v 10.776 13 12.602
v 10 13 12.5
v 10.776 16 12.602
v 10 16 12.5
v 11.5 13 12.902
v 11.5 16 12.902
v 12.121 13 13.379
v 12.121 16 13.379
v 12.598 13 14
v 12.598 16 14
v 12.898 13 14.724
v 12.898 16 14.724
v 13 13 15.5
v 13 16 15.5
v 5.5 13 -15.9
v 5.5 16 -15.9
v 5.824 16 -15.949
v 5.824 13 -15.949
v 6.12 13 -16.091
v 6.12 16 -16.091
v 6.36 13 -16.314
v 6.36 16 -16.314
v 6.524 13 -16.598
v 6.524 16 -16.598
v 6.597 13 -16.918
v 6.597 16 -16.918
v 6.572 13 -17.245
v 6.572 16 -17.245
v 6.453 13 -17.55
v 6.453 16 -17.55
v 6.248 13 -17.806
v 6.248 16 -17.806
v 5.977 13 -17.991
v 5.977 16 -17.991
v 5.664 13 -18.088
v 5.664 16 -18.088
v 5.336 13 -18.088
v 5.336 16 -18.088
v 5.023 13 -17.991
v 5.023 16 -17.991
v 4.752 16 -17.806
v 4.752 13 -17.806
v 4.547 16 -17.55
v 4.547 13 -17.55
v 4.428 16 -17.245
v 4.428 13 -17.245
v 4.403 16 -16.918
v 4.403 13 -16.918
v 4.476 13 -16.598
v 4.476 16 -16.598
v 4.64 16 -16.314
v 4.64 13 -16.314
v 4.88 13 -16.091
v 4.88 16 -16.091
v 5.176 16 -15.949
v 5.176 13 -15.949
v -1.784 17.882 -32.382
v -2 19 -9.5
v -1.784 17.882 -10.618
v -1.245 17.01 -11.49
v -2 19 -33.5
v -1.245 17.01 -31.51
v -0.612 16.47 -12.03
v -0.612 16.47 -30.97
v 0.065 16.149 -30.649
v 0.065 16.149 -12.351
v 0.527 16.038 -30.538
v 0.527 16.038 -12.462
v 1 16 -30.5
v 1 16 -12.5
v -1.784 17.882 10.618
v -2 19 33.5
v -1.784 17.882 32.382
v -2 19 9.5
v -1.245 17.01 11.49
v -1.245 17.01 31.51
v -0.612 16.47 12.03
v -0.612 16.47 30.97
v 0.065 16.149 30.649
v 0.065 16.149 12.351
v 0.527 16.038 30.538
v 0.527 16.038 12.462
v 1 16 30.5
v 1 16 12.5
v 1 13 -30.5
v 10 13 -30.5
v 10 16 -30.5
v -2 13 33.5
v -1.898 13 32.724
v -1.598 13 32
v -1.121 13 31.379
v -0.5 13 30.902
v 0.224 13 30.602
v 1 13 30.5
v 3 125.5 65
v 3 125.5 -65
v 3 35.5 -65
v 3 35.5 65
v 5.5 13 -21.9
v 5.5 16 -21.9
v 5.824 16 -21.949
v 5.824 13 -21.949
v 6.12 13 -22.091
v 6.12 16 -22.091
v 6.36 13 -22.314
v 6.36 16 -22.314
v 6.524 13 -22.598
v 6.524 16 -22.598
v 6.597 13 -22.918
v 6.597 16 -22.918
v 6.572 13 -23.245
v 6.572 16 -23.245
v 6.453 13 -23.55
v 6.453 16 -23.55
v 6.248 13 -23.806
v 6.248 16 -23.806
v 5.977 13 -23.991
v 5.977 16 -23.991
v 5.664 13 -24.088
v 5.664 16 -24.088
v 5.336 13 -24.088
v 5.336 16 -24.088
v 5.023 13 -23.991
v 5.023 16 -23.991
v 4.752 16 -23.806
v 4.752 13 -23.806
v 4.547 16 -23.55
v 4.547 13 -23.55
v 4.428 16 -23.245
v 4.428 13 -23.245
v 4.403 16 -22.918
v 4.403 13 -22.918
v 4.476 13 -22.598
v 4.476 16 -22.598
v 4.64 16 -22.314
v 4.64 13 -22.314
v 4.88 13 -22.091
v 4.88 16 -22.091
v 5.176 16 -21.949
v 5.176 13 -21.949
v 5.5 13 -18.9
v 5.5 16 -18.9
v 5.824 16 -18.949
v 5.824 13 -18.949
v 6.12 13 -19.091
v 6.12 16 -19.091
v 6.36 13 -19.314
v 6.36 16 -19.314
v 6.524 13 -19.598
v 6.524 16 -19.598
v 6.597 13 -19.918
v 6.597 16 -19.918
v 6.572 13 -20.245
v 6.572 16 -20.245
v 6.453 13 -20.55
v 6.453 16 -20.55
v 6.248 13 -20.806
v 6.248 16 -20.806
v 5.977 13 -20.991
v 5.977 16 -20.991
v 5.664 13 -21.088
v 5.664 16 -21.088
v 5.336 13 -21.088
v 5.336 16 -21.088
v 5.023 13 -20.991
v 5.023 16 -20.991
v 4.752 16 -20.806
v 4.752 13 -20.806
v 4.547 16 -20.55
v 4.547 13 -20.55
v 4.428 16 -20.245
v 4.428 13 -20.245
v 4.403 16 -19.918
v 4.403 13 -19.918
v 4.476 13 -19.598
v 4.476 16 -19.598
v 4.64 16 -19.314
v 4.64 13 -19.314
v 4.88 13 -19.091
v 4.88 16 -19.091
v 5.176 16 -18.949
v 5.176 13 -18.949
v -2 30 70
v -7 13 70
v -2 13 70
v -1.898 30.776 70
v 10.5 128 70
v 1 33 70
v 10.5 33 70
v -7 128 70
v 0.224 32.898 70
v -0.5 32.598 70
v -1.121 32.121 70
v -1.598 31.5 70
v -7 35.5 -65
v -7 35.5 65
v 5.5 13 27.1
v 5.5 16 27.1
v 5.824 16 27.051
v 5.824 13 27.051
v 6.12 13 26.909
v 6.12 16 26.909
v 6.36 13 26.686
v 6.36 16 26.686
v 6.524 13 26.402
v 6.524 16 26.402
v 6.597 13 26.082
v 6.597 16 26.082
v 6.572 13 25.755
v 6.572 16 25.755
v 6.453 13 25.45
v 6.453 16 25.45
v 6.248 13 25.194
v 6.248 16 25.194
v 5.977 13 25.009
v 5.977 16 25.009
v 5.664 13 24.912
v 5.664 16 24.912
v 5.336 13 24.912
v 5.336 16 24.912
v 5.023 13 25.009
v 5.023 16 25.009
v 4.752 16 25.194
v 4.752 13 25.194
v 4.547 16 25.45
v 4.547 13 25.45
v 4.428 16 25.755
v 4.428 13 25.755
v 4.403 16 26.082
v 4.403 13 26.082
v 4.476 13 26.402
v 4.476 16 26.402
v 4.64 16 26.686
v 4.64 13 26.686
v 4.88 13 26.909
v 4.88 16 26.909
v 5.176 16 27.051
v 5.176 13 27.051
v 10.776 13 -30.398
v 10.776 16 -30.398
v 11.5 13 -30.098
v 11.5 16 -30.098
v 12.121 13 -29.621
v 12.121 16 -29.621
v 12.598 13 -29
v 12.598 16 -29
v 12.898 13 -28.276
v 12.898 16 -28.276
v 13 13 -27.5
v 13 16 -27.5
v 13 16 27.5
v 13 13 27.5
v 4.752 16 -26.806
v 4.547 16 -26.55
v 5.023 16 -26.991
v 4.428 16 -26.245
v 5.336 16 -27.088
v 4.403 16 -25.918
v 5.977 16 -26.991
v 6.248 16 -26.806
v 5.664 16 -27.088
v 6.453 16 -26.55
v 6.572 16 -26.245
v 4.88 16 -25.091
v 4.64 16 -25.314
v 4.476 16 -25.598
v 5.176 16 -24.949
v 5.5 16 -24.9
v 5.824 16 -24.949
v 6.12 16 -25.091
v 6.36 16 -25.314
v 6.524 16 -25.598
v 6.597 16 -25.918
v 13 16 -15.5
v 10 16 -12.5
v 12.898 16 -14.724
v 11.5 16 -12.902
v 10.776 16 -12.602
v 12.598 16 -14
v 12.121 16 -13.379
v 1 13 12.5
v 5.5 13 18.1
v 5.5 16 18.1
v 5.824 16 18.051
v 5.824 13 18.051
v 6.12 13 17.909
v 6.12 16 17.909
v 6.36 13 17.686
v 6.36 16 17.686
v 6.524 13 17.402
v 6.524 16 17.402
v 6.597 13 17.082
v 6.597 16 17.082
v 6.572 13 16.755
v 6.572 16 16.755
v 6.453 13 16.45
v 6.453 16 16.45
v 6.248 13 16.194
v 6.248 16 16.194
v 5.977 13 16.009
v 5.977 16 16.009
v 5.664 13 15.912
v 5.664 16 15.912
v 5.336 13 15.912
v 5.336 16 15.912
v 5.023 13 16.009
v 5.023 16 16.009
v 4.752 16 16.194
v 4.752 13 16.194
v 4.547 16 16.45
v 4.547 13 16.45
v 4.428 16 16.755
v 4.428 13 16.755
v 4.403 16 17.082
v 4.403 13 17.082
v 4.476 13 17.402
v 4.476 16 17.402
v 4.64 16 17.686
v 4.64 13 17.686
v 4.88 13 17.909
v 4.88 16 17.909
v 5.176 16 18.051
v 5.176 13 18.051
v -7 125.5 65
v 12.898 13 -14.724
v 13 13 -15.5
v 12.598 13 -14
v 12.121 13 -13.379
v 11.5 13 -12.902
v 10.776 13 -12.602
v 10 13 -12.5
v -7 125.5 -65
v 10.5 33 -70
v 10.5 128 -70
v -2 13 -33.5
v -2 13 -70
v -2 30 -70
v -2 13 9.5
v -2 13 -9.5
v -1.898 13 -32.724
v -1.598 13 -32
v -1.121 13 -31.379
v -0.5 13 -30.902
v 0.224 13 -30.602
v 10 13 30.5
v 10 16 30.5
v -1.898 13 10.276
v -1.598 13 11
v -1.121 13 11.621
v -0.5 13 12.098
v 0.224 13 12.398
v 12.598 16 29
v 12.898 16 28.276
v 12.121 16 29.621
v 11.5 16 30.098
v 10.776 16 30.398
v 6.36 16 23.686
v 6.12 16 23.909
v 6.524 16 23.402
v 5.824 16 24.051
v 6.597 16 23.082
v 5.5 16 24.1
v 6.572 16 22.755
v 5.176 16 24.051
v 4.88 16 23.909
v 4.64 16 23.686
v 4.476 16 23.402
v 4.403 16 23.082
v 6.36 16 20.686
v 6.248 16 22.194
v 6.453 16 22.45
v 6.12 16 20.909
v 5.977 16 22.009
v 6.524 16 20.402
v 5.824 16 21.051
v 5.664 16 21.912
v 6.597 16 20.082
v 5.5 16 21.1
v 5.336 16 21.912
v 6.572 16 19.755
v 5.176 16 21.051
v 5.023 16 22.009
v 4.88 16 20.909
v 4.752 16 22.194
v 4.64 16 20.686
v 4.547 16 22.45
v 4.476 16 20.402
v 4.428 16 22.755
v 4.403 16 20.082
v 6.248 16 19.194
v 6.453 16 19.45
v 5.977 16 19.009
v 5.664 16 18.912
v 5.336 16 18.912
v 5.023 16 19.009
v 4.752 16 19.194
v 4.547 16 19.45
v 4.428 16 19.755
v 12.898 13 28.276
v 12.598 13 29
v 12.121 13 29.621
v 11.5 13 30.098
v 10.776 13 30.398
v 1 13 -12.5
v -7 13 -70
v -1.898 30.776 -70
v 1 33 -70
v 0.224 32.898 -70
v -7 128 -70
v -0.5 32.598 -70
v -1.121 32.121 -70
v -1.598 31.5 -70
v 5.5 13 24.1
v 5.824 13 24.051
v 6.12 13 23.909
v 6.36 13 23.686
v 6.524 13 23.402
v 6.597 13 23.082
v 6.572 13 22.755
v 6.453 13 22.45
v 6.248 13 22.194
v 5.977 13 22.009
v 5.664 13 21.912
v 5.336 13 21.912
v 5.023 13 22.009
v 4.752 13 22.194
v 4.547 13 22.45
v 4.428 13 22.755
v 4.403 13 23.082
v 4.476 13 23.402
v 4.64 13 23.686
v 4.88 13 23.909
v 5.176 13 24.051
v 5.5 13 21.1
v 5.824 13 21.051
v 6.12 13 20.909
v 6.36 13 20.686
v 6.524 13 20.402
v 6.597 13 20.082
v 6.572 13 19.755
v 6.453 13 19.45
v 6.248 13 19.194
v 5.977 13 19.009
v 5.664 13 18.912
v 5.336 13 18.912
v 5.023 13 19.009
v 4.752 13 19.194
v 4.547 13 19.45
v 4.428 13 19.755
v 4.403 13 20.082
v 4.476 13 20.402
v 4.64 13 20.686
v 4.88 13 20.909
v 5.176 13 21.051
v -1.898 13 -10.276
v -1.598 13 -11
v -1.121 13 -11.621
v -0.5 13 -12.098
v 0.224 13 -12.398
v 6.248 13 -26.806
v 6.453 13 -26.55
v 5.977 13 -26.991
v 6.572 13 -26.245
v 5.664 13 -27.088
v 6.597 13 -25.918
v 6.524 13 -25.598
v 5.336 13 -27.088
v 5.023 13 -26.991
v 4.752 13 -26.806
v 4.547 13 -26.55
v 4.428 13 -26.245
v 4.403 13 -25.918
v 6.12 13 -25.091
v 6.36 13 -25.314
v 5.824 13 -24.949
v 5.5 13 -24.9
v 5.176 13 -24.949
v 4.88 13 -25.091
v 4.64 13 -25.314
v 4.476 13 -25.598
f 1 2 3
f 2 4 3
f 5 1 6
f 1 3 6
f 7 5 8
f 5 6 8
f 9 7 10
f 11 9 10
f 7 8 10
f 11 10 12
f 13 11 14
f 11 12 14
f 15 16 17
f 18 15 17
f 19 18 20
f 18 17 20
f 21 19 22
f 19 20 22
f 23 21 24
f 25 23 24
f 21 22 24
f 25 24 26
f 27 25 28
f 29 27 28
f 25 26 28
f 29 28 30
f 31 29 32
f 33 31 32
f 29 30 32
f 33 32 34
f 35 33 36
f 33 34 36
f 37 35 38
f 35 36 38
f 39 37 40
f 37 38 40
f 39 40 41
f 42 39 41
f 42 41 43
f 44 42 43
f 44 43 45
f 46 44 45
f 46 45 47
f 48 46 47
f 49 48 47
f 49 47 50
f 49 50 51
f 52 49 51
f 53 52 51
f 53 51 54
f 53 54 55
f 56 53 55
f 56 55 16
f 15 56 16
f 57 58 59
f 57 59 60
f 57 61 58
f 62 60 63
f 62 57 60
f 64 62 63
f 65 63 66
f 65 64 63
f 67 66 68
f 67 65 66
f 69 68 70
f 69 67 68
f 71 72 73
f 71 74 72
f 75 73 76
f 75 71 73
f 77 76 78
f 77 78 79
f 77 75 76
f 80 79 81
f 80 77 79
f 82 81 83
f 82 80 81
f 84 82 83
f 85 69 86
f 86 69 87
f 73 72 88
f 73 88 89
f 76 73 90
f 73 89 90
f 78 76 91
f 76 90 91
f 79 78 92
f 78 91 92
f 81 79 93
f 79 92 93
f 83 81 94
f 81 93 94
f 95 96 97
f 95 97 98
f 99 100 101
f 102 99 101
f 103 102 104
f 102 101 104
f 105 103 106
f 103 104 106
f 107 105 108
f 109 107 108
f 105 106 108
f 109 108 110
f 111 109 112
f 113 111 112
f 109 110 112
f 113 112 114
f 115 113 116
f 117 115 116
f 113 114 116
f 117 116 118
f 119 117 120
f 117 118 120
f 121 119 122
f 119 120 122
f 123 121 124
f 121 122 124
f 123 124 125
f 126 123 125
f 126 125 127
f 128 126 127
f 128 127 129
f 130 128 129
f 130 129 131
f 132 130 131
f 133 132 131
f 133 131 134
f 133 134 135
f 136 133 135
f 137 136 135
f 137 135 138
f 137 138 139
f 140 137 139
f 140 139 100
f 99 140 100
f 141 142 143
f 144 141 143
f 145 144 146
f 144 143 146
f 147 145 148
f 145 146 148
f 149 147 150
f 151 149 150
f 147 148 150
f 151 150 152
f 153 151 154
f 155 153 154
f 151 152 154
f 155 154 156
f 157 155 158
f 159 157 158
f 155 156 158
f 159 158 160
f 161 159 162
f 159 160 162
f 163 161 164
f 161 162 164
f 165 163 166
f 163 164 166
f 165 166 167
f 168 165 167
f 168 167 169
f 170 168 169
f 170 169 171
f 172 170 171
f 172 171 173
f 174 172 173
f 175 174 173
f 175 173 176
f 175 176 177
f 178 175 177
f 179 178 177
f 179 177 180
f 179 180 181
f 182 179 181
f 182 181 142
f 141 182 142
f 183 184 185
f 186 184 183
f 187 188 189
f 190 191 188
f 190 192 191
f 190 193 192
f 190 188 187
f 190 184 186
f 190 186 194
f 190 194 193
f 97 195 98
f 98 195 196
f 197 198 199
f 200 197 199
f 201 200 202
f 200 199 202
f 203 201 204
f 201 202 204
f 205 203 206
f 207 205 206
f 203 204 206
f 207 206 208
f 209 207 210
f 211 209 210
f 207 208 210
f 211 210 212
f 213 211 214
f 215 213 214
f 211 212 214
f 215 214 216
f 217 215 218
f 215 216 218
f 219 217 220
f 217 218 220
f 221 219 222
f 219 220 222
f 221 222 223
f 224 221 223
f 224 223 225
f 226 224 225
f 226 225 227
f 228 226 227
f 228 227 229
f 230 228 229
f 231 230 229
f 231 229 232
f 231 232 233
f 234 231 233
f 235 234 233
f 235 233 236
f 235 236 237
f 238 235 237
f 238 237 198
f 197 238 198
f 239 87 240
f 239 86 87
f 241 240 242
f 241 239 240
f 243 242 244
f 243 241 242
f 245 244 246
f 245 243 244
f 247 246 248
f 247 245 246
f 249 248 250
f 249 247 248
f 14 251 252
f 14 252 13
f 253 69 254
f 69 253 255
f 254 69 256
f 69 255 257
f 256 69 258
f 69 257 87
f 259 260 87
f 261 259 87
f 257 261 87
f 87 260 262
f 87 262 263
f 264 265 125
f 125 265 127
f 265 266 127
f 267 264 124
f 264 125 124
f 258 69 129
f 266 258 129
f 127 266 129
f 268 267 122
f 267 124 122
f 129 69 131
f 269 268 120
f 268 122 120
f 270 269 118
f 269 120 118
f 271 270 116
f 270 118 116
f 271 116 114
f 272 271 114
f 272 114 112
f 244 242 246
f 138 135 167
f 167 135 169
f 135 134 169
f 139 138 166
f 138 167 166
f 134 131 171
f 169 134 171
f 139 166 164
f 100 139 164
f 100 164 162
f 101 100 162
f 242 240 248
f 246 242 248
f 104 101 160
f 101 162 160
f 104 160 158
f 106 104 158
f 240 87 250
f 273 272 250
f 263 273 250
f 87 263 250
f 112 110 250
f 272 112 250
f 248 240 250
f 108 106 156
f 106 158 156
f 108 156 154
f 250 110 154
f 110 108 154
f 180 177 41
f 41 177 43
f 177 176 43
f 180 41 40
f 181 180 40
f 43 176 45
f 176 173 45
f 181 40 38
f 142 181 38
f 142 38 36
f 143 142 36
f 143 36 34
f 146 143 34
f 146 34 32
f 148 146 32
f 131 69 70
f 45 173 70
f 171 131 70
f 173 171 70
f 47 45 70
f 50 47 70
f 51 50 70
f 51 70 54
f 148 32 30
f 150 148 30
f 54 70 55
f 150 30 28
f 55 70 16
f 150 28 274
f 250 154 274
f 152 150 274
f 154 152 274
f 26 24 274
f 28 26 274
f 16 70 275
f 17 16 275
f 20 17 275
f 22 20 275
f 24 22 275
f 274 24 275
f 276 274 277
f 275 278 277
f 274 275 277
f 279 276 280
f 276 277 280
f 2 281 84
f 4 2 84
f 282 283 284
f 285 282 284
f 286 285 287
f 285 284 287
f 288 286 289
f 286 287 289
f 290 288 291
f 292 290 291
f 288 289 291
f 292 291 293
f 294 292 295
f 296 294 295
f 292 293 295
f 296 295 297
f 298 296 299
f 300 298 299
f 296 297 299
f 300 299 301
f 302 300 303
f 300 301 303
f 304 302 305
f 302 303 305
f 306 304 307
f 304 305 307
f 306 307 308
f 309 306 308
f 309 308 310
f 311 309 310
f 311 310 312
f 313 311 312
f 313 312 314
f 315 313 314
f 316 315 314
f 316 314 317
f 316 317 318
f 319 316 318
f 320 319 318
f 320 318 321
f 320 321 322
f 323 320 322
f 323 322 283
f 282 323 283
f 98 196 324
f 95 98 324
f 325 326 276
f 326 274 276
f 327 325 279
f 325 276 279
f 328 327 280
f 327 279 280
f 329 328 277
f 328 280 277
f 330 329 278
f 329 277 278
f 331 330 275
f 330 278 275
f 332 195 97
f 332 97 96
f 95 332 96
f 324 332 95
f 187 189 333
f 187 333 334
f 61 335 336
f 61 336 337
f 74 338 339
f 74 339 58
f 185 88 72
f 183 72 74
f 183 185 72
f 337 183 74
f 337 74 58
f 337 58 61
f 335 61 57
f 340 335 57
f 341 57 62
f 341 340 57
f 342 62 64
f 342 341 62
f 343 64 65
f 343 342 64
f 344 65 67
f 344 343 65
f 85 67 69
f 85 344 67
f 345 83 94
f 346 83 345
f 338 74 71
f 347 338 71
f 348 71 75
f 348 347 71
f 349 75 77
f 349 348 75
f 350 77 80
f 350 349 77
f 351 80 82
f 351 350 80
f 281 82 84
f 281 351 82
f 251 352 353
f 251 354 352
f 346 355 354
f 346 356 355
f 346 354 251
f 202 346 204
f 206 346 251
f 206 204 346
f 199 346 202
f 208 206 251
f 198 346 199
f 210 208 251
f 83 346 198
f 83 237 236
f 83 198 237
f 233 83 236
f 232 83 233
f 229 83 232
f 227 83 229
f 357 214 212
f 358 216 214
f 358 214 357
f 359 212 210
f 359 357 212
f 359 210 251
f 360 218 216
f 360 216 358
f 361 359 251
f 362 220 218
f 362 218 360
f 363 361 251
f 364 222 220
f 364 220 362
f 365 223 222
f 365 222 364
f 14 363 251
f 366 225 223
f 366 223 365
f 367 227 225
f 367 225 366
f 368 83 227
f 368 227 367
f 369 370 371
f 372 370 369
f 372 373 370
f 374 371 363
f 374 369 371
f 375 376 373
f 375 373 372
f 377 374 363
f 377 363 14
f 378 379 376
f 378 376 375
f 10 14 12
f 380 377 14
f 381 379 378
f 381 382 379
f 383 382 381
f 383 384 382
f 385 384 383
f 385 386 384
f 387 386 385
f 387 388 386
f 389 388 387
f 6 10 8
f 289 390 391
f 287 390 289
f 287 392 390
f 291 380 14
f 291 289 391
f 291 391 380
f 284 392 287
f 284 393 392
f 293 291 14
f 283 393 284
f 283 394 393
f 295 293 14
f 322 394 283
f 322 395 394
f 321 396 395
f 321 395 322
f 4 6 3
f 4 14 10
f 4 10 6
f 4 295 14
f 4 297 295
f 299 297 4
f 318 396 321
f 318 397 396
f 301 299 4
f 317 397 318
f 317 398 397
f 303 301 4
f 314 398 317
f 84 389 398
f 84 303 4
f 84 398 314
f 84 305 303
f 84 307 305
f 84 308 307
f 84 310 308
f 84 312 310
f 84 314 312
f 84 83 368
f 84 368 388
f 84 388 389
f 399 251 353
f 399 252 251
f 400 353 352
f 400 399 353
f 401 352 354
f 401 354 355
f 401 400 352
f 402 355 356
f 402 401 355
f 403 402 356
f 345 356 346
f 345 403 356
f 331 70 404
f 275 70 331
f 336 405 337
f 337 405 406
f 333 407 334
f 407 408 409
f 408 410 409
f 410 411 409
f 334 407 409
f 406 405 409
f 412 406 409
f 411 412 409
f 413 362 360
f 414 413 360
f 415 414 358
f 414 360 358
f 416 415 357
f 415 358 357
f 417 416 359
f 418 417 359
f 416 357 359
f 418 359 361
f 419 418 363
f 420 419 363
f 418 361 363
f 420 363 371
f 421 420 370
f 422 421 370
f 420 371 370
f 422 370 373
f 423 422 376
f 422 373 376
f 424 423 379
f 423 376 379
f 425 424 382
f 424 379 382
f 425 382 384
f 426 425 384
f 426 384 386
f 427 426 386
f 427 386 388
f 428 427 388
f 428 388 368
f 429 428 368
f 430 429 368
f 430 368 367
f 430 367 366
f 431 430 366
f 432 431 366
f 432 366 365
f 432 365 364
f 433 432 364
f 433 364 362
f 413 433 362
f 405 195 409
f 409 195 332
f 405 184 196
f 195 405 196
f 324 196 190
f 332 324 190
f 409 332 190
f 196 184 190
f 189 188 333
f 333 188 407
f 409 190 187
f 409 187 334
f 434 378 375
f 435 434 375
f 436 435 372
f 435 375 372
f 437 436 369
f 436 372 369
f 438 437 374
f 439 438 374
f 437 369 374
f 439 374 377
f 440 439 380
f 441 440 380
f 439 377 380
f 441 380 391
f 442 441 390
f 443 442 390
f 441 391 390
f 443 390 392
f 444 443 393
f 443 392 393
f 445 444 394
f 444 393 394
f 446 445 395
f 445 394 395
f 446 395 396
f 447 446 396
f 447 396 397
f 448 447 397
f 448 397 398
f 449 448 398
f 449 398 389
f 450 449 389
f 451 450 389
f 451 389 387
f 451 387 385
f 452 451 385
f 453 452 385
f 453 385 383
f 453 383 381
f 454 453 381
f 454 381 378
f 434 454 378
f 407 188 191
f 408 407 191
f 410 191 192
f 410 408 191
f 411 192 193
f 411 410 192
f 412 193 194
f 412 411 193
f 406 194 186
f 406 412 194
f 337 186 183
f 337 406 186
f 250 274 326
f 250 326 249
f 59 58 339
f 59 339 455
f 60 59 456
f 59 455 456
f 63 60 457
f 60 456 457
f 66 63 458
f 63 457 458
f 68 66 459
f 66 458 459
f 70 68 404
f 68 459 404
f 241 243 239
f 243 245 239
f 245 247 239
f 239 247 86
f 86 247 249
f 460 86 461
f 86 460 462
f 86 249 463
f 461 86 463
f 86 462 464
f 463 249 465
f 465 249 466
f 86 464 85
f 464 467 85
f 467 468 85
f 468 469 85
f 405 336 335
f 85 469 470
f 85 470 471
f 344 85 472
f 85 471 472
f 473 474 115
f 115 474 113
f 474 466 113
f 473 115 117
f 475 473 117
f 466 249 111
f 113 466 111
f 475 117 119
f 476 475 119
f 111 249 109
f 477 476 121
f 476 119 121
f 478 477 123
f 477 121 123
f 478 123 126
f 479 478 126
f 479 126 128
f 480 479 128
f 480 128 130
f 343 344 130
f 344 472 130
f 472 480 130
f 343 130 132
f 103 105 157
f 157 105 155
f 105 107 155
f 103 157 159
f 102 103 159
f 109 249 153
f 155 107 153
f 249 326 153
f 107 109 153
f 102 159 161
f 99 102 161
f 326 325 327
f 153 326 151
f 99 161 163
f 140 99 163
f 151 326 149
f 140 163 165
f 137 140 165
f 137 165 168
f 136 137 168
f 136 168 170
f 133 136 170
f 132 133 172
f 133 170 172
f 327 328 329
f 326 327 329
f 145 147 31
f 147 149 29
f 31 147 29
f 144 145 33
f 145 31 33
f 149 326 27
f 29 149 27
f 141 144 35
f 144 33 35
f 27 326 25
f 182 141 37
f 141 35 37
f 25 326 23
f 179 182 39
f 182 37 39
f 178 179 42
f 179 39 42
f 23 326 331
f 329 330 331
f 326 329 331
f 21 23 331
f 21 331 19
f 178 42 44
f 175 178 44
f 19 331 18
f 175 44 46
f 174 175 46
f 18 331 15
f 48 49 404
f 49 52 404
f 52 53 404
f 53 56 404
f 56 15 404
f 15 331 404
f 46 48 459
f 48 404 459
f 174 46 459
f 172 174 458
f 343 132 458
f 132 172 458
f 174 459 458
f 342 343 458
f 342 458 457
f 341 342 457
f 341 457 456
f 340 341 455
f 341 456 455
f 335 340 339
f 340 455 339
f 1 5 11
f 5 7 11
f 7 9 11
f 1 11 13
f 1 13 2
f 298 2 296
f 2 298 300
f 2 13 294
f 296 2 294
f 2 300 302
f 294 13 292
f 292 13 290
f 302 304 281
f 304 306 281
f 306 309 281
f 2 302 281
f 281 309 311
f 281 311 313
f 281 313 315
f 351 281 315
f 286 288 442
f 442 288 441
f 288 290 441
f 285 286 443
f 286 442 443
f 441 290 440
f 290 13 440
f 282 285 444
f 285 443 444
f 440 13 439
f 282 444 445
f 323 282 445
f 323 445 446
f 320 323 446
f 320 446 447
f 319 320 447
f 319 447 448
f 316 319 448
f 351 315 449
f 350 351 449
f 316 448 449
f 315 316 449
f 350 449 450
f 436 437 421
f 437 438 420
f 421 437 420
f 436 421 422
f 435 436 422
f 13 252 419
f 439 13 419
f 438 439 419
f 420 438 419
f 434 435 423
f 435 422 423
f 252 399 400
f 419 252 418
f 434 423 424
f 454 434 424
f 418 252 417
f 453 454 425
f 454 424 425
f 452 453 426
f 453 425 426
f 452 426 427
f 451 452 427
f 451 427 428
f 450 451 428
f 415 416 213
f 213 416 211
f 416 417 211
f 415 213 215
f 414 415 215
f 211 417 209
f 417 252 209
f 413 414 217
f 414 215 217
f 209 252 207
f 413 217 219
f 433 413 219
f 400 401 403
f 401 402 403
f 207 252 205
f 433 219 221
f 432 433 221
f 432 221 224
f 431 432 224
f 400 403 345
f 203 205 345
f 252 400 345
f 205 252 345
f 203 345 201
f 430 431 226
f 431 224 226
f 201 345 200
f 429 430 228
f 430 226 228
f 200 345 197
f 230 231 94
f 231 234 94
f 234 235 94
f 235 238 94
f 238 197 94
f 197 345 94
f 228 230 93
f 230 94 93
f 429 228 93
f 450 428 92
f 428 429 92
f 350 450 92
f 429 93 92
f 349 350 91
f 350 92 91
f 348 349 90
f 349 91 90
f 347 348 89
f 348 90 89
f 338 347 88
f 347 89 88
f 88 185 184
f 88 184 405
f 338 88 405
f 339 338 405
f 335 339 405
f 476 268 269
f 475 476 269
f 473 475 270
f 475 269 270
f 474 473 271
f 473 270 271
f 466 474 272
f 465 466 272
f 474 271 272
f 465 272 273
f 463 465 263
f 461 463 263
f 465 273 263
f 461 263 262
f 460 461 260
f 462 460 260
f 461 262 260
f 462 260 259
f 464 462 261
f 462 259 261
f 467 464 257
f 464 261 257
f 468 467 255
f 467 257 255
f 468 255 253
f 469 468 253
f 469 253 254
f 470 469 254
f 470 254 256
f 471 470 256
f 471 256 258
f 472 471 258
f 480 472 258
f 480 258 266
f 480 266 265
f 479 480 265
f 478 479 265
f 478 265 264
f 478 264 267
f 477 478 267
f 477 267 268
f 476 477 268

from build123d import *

# Parameters (mm, degrees)
SKETCH1_R            = 10
BOSS_EXTRUDE1_DEPTH  = 3
SKETCH2_R            = 5
BOSS_EXTRUDE2_DEPTH  = 100
CUT_EXTRUDE1_DEPTH   = 15
SKETCH4_W            = 14
SKETCH4_H            = 100
BOSS_EXTRUDE3_DEPTH  = 90
BOSS_EXTRUDE4_START  = 5
SKETCH5_R            = 10
BOSS_EXTRUDE4_DEPTH  = 3
SKETCH7_W            = 31.538450714
SKETCH7_H            = 13
CUT_EXTRUDE2_DEPTH   = 80
SKETCH8_W            = 9
SKETCH8_H            = 87
CUT_EXTRUDE3_DEPTH   = 130
SKETCH9_W            = 9
SKETCH9_H            = 25
CUT_EXTRUDE4_DEPTH   = 80
SKETCH10_W           = 37.5
SKETCH10_H           = 3
BOSS_EXTRUDE5_DEPTH  = 6
SKETCH11_R           = 1.1
CUT_EXTRUDE5_DEPTH   = 56
SKETCH14_W           = 15
SKETCH14_H           = 19.5
CUT_EXTRUDE6_DEPTH   = 56
FILLET1_R            = 3
SKETCH19_W           = 5
SKETCH19_H           = 100
BOSS_EXTRUDE6_DEPTH  = 25
SKETCH22_W           = 5
SKETCH22_H           = 115
BOSS_EXTRUDE8_DEPTH  = 20
SKETCH23_W           = 5
SKETCH23_H           = 115
BOSS_EXTRUDE9_DEPTH  = 20
SKETCH24_W           = 140
SKETCH24_H           = 95
BOSS_EXTRUDE10_DEPTH = 15
SKETCH25_W           = 130
SKETCH25_H           = 90
CUT_EXTRUDE7_DEPTH   = 10
FILLET2_R            = 3
SKETCH26_W           = 2.5
SKETCH26_H           = 95
CUT_EXTRUDE8_DEPTH   = 130
SKETCH27_W           = 2.5
SKETCH27_H           = 10
CUT_EXTRUDE9_DEPTH   = 136.255314129


with BuildPart() as part:
    # Sketch1 → Boss-Extrude1 (new body)
    with BuildSketch(Plane(origin=(0, 0, 0), x_dir=(1, 0, 0), z_dir=(0, 1, 0))):
        with Locations(Location((0, 0, 0), (0, 0, 270))):
            Circle(SKETCH1_R)
    extrude(amount=BOSS_EXTRUDE1_DEPTH)

    # Sketch2 → Boss-Extrude2 (add)
    with BuildSketch(Plane(origin=(0, 3, 0), x_dir=(1, 0, 0), z_dir=(0, 1, 0))):
        with Locations(Location((0, 0, 0), (0, 0, 270))):
            Circle(SKETCH2_R)
    extrude(amount=BOSS_EXTRUDE2_DEPTH)

    # Sketch3 → Cut-Extrude1 (cut)
    with BuildSketch(Plane.XZ):
        with BuildLine():
            ThreePointArc((-1.889982989, -1.636448686), (2.5, 0), (-1.889982989, 1.636448686))
            Line((-1.889982989, 1.636448686), (-1.889982989, -1.636448686))
        make_face()
    extrude(amount=-CUT_EXTRUDE1_DEPTH, mode=Mode.SUBTRACT)

    # Sketch4 → Boss-Extrude3 (add)
    with BuildSketch(Plane(origin=(0, 103, 0), x_dir=(1, 0, 0), z_dir=(0, 1, 0))):
        Rectangle(SKETCH4_W, SKETCH4_H)
    extrude(amount=-BOSS_EXTRUDE3_DEPTH)

    # Sketch5 → Boss-Extrude4 (add)
    with BuildSketch(Plane(origin=(0, 3, 0), x_dir=(1, 0, 0), z_dir=(0, 1, 0)).offset(BOSS_EXTRUDE4_START)):
        with Locations(Location((0, 0, 0), (0, 0, 270))):
            Circle(SKETCH5_R)
    extrude(amount=BOSS_EXTRUDE4_DEPTH)

    # Sketch7 → Cut-Extrude2 (cut)
    with BuildSketch(Plane.XY.offset(50)):
        with Locations((1.592851046, 6.5)):
            Rectangle(SKETCH7_W, SKETCH7_H)
    extrude(amount=-CUT_EXTRUDE2_DEPTH, mode=Mode.SUBTRACT)

    # Sketch8 → Cut-Extrude3 (cut)
    with BuildSketch(Plane.XY.offset(50)):
        with Locations((2.5, 59.5)):
            Rectangle(SKETCH8_W, SKETCH8_H)
    extrude(amount=-CUT_EXTRUDE3_DEPTH, mode=Mode.SUBTRACT)

    # Sketch9 → Cut-Extrude4 (cut)
    with BuildSketch(Plane(origin=(0, 16, 0), x_dir=(1, 0, 0), z_dir=(0, 1, 0))):
        with Locations((2.5, 0)):
            Rectangle(SKETCH9_W, SKETCH9_H)
    extrude(amount=-CUT_EXTRUDE4_DEPTH, mode=Mode.SUBTRACT)

    # Sketch10 → Boss-Extrude5 (add)
    with BuildSketch(Plane(origin=(7, 0, 0), x_dir=(0, 0, -1), z_dir=(1, 0, 0))):
        with Locations((-31.25, 14.5)):
            Rectangle(SKETCH10_W, SKETCH10_H)
        with Locations((31.25, 14.5)):
            Rectangle(SKETCH10_W, SKETCH10_H)
    extrude(amount=BOSS_EXTRUDE5_DEPTH)

    # Sketch11 → Cut-Extrude5 (cut)
    with BuildSketch(Plane(origin=(0, 16, 0), x_dir=(1, 0, 0), z_dir=(0, 1, 0))):
        with Locations(Location((5.5, -17, 0), (0, 0, 270))):
            Circle(SKETCH11_R)
        with Locations(Location((5.5, -20, 0), (0, 0, 270))):
            Circle(SKETCH11_R)
        with Locations(Location((5.5, -23, 0), (0, 0, 270))):
            Circle(SKETCH11_R)
        with Locations(Location((5.5, -26, 0), (0, 0, 270))):
            Circle(SKETCH11_R)
        with Locations(Location((5.5, 26, 0), (0, 0, 270))):
            Circle(SKETCH11_R)
        with Locations(Location((5.5, 23, 0), (0, 0, 270))):
            Circle(SKETCH11_R)
        with Locations(Location((5.5, 20, 0), (0, 0, 270))):
            Circle(SKETCH11_R)
        with Locations(Location((5.5, 17, 0), (0, 0, 270))):
            Circle(SKETCH11_R)
    extrude(amount=-CUT_EXTRUDE5_DEPTH, mode=Mode.SUBTRACT)

    # Sketch14 → Cut-Extrude6 (cut)
    with BuildSketch(Plane(origin=(0, 16, 0), x_dir=(1, 0, 0), z_dir=(0, 1, 0))):
        with Locations((5.5, -40.25)):
            Rectangle(SKETCH14_W, SKETCH14_H)
        with Locations((5.5, 40.25)):
            Rectangle(SKETCH14_W, SKETCH14_H)
    extrude(amount=-CUT_EXTRUDE6_DEPTH, mode=Mode.SUBTRACT)

    # Fillet1
    fillet1_edges = [part.edges().sort_by_distance(p)[0] for p in [
        (-2, 16, 21.5),
        (-2, 14.5, 12.5),
        (-2, 14.5, -12.5),
        (13, 14.5, 12.5),
        (13, 14.5, -12.5),
        (13, 14.5, -30.5),
        (13, 14.5, 30.5),
        (-2, 16, -21.5),
        (-2, 14.5, 30.5),
        (-2, 14.5, -30.5),
    ]]
    fillet(fillet1_edges, radius=FILLET1_R)

    # Sketch19 → Boss-Extrude6 (add)
    with BuildSketch(Plane(origin=(0, 103, 0), x_dir=(1, 0, 0), z_dir=(0, 1, 0))):
        with Locations((-4.5, 0)):
            Rectangle(SKETCH19_W, SKETCH19_H)
    extrude(amount=BOSS_EXTRUDE6_DEPTH)

    # Sketch22 → Boss-Extrude8 (add)
    with BuildSketch(Plane.XY.offset(50)):
        with Locations((-4.5, 70.5)):
            Rectangle(SKETCH22_W, SKETCH22_H)
    extrude(amount=BOSS_EXTRUDE8_DEPTH)

    # Sketch23 → Boss-Extrude9 (add)
    with BuildSketch(Plane(origin=(0, 0, -50), x_dir=(-1, 0, 0), z_dir=(0, 0, -1))):
        with Locations((4.5, 70.5)):
            Rectangle(SKETCH23_W, SKETCH23_H)
    extrude(amount=BOSS_EXTRUDE9_DEPTH)

    # Sketch24 → Boss-Extrude10 (add)
    with BuildSketch(Plane(origin=(-2, 0, 0), x_dir=(0, 0, -1), z_dir=(1, 0, 0))):
        with Locations((0, 80.5)):
            Rectangle(SKETCH24_W, SKETCH24_H)
    extrude(amount=BOSS_EXTRUDE10_DEPTH)

    # Sketch25 → Cut-Extrude7 (cut)
    with BuildSketch(Plane.ZY.offset(7)):
        with Locations((0, 80.5)):
            Rectangle(SKETCH25_W, SKETCH25_H)
    extrude(amount=-CUT_EXTRUDE7_DEPTH, mode=Mode.SUBTRACT)

    # Fillet2
    fillet2_edges = [part.edges().sort_by_distance(p)[0] for p in [
        (-2, 33, 0),
    ]]
    fillet(fillet2_edges, radius=FILLET2_R)

    # Sketch26 → Cut-Extrude8 (cut)
    with BuildSketch(Plane.XY.offset(70)):
        with Locations((11.75, 80.5)):
            Rectangle(SKETCH26_W, SKETCH26_H)
    extrude(amount=-CUT_EXTRUDE8_DEPTH, mode=Mode.SUBTRACT)

    # Sketch27 → Cut-Extrude9 (cut, through all)
    with BuildSketch(Plane(origin=(0, 128, 0), x_dir=(1, 0, 0), z_dir=(0, 1, 0))):
        with Locations((11.75, 65)):
            Rectangle(SKETCH27_W, SKETCH27_H)
    extrude(amount=-CUT_EXTRUDE9_DEPTH, mode=Mode.SUBTRACT)


solid = part.part
